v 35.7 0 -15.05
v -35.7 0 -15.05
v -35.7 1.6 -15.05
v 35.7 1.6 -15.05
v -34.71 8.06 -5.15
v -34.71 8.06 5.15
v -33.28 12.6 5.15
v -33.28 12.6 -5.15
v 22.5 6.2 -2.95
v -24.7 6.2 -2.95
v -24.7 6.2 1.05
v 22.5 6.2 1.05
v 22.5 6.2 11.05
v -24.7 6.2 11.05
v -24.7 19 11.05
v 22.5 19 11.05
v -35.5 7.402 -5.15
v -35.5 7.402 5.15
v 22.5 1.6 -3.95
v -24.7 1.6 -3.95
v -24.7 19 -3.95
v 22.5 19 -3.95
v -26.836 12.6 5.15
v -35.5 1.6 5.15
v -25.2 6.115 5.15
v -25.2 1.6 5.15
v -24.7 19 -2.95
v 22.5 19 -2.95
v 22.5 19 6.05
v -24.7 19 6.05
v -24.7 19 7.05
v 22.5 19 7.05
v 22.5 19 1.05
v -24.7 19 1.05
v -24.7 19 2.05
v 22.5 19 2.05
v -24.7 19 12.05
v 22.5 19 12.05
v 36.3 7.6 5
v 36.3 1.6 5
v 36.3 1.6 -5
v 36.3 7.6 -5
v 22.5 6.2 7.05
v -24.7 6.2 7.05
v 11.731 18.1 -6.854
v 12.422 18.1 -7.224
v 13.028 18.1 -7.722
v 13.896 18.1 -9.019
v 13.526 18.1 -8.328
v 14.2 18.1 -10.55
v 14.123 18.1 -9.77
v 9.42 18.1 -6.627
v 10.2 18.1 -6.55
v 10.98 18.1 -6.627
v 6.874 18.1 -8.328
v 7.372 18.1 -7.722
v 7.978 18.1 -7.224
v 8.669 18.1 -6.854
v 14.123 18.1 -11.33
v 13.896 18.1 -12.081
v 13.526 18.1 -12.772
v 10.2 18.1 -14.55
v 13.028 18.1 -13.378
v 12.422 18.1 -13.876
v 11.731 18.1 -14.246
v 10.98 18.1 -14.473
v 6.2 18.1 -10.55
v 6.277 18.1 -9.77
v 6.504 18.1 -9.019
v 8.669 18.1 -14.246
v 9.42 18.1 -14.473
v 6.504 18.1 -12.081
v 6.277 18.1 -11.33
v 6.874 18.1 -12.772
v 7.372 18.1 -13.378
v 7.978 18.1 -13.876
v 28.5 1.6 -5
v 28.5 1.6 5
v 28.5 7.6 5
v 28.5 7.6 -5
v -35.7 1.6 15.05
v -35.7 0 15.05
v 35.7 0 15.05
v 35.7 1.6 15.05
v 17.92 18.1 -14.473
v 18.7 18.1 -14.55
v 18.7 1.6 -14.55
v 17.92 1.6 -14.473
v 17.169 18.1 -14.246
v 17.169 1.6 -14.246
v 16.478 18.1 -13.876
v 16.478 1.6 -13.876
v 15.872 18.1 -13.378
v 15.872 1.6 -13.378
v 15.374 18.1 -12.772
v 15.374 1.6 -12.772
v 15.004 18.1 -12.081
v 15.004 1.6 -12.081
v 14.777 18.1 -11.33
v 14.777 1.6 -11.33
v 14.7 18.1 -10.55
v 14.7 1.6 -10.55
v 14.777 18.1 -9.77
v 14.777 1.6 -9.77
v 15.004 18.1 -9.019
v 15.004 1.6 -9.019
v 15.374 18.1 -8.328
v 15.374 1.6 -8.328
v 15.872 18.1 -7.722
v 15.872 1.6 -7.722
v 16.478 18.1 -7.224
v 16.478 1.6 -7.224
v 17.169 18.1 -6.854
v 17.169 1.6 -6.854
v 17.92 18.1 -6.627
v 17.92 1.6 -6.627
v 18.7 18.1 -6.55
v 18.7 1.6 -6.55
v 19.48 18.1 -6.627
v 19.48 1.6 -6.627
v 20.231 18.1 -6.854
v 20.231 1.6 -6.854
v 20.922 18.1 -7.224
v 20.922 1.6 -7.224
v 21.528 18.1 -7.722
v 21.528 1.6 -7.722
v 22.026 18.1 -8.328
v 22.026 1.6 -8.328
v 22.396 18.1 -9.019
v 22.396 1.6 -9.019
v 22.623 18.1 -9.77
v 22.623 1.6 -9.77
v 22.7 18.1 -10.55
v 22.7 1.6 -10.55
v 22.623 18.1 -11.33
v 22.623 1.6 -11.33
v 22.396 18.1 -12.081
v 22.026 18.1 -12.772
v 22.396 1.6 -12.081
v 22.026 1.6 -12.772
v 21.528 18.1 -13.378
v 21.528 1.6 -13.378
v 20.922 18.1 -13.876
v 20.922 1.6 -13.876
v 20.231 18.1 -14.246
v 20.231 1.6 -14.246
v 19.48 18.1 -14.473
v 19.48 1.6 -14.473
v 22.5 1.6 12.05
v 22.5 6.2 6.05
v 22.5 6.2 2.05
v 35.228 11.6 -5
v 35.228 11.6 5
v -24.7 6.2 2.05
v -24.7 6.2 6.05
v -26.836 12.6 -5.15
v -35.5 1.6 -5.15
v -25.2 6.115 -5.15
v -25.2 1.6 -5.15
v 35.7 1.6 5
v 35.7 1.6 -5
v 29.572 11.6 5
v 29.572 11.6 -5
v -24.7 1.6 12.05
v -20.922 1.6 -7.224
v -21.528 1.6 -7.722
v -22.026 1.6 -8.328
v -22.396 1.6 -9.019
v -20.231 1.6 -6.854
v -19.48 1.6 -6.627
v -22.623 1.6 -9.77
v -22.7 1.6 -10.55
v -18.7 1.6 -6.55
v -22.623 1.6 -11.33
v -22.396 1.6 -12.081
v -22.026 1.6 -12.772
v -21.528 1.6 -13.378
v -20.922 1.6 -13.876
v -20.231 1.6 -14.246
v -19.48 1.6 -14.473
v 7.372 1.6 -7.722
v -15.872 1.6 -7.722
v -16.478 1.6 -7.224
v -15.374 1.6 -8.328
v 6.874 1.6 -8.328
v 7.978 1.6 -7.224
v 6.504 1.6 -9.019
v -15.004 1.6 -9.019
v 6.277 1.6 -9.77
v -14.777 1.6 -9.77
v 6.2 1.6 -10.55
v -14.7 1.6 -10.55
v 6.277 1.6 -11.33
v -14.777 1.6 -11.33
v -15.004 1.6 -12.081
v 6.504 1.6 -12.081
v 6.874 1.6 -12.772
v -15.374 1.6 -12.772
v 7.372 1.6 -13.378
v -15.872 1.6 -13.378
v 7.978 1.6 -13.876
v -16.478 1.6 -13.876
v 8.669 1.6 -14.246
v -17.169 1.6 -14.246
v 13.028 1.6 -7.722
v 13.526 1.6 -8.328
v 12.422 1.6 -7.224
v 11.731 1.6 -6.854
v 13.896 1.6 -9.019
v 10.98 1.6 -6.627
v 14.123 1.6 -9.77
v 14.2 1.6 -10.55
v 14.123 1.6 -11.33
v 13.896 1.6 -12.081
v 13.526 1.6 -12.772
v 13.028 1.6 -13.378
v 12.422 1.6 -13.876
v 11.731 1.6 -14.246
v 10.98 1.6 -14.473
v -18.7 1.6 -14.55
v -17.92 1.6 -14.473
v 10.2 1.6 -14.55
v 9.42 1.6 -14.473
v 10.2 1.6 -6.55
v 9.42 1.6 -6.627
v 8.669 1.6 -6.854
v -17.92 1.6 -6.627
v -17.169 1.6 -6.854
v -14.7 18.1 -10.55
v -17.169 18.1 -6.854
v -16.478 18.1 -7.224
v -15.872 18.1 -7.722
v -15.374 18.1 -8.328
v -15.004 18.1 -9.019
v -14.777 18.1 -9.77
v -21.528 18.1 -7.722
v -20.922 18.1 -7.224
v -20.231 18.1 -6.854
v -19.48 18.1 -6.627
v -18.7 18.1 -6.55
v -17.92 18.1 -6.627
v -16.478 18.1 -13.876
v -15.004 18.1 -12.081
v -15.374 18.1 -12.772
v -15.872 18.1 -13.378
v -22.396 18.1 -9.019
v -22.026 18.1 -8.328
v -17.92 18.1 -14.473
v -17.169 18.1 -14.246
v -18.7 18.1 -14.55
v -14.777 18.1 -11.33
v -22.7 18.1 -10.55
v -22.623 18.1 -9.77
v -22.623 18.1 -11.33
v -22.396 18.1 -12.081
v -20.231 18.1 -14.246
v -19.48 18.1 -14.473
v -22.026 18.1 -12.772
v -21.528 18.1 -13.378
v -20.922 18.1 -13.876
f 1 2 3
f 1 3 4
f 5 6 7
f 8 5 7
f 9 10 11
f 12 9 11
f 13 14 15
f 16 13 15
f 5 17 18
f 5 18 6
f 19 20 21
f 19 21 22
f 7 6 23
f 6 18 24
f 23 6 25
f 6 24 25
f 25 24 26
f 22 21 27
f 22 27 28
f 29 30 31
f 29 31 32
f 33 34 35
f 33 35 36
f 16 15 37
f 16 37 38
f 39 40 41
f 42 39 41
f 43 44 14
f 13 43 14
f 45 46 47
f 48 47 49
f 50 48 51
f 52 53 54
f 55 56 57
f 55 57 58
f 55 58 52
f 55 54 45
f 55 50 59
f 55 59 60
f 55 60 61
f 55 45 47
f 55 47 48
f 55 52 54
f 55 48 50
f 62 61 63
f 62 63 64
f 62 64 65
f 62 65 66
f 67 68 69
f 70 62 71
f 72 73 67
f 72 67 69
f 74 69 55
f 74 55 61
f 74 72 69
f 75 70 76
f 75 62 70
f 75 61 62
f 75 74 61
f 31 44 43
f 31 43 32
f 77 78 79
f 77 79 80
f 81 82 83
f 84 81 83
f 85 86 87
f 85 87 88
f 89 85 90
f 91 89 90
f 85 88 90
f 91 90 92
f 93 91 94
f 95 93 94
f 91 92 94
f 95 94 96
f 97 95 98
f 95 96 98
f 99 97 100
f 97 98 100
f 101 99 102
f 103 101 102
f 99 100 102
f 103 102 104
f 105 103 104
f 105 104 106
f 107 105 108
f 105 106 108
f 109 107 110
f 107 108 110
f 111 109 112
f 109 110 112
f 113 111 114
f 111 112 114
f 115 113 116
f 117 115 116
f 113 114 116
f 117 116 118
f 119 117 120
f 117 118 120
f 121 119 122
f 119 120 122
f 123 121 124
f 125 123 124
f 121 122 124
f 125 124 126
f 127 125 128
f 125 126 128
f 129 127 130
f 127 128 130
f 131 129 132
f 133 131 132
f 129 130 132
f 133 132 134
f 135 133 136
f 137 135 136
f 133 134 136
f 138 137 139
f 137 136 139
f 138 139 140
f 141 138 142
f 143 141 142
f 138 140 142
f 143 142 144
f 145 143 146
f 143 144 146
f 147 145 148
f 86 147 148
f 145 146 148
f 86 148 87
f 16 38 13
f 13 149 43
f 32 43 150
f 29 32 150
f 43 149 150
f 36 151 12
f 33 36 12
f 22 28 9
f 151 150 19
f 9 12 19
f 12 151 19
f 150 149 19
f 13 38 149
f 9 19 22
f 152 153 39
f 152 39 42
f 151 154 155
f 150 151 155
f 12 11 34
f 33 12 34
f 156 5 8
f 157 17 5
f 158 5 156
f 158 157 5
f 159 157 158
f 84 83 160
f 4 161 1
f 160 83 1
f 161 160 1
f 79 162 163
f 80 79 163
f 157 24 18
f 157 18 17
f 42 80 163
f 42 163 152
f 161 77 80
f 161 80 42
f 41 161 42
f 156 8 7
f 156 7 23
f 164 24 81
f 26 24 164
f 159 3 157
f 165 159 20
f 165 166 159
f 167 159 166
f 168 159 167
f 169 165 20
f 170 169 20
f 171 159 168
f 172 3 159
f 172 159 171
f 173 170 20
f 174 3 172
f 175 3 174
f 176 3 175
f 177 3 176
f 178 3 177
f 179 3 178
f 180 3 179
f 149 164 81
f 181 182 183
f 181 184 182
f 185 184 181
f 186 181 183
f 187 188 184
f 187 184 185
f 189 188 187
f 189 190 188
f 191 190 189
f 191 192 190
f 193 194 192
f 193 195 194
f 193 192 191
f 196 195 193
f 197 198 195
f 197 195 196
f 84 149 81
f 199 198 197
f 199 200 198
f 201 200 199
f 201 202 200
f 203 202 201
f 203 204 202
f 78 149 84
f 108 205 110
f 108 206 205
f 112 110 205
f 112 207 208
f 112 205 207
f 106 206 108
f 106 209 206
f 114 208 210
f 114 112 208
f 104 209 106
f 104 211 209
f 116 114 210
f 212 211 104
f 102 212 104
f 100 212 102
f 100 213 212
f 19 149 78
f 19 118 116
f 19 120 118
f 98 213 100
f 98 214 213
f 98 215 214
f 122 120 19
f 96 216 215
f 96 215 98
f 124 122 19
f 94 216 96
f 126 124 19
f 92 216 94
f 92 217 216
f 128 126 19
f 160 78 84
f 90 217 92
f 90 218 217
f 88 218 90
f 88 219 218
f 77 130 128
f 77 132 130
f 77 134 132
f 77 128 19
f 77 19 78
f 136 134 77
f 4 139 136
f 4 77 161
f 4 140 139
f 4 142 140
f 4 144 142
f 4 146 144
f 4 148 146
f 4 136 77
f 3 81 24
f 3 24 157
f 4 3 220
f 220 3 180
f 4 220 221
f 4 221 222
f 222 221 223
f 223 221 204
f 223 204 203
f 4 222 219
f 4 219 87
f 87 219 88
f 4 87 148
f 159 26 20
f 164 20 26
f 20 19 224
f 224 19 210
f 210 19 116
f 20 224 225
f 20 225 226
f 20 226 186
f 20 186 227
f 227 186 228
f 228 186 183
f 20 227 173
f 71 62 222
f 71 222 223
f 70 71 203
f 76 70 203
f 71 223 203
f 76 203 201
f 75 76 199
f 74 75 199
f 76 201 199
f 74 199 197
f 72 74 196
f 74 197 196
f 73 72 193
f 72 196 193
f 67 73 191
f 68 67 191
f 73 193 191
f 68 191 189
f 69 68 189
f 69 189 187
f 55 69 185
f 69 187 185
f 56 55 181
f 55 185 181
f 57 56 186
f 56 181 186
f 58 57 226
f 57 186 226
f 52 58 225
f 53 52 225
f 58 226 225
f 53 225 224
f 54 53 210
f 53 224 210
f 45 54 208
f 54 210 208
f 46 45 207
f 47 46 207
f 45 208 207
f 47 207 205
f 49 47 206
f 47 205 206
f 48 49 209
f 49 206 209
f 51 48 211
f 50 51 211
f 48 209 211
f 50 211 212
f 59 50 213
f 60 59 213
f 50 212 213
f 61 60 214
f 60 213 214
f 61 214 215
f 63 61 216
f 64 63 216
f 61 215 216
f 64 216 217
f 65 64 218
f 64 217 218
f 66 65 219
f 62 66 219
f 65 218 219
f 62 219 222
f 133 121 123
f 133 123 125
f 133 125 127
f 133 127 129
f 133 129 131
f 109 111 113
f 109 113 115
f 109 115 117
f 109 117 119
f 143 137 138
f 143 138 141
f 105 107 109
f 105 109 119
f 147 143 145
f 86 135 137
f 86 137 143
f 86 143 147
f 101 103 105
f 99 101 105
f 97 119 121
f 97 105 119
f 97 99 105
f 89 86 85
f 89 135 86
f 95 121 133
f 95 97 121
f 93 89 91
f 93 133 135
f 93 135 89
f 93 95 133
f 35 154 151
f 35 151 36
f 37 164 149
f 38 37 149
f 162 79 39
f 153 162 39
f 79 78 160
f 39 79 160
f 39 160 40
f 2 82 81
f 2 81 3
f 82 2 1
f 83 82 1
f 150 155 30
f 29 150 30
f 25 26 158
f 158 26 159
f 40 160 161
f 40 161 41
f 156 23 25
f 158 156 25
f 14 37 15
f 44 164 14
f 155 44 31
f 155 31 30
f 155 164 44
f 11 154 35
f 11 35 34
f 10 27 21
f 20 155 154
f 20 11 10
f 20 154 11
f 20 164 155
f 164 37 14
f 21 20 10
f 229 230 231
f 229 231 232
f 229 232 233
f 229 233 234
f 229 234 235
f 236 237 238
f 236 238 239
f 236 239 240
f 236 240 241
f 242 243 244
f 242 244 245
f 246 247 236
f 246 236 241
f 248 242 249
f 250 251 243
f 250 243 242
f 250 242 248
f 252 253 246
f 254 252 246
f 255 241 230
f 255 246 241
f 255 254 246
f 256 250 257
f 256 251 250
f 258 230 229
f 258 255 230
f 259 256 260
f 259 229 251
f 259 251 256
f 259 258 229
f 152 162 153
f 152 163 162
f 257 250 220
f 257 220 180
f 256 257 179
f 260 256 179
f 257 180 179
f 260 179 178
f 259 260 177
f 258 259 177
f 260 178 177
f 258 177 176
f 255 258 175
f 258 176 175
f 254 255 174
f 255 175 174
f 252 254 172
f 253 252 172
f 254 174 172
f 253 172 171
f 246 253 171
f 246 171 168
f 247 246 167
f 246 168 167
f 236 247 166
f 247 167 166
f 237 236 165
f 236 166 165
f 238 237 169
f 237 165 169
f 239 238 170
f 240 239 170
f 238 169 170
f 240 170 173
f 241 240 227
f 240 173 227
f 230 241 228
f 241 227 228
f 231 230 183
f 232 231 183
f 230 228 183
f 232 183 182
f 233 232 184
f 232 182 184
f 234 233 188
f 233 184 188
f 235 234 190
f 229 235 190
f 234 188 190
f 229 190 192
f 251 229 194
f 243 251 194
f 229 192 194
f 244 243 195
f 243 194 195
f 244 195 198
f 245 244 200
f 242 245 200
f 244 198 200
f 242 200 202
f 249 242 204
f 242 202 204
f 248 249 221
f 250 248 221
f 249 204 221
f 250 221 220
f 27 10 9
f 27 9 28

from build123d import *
from OCP.BRepFilletAPI import BRepFilletAPI_MakeChamfer

# Parameters (mm, degrees)
SKETCH1_W           = 71.4
SKETCH1_H           = 30.1
BOSS_EXTRUDE1_DEPTH = 1.6
SKETCH4_W           = 47.2
SKETCH4_H           = 16
BOSS_EXTRUDE2_DEPTH = 17.4
SKETCH5_W           = 10.3
SKETCH5_H           = 10.3
BOSS_EXTRUDE3_DEPTH = 11
SKETCH6_W           = 7.8
SKETCH6_H           = 10
BOSS_EXTRUDE4_DEPTH = 10
SKETCH7_R           = 4
BOSS_EXTRUDE5_DEPTH = 16.5
SKETCH8_W           = 4
SKETCH8_H           = 12.8
CUT_EXTRUDE1_DEPTH  = 47.2
CUT_EXTRUDE2_DEPTH  = 10.3
CHAMFER1_SIZE       = 4
CHAMFER1_SIZE2      = 1.07179677


with BuildPart() as part:
    # Sketch1 → Boss-Extrude1 (new body)
    with BuildSketch(Plane(origin=(0, 0, 0), x_dir=(1, 0, 0), z_dir=(0, 1, 0))):
        Rectangle(SKETCH1_W, SKETCH1_H)
    extrude(amount=BOSS_EXTRUDE1_DEPTH)

    # Sketch4 → Boss-Extrude2 (add)
    with BuildSketch(Plane(origin=(0, 1.6, 0), x_dir=(1, 0, 0), z_dir=(0, 1, 0))):
        with Locations((-1.1, -4.05)):
            Rectangle(SKETCH4_W, SKETCH4_H)
    extrude(amount=BOSS_EXTRUDE2_DEPTH)

    # Sketch5 → Boss-Extrude3 (add)
    with BuildSketch(Plane(origin=(0, 1.6, 0), x_dir=(1, 0, 0), z_dir=(0, 1, 0))):
        with Locations((-30.35, 0)):
            Rectangle(SKETCH5_W, SKETCH5_H)
    extrude(amount=BOSS_EXTRUDE3_DEPTH)

    # Sketch6 → Boss-Extrude4 (add)
    with BuildSketch(Plane(origin=(0, 1.6, 0), x_dir=(1, 0, 0), z_dir=(0, 1, 0))):
        with Locations((32.4, 0)):
            Rectangle(SKETCH6_W, SKETCH6_H)
    extrude(amount=BOSS_EXTRUDE4_DEPTH)

    # Sketch7 → Boss-Extrude5 (add)
    with BuildSketch(Plane(origin=(0, 1.6, 0), x_dir=(1, 0, 0), z_dir=(0, 1, 0))):
        with Locations(Location((18.7, 10.55, 0), (0, 0, 90))):
            Circle(SKETCH7_R)
        with Locations(Location((10.2, 10.55, 0), (0, 0, 90))):
            Circle(SKETCH7_R)
        with Locations(Location((-18.7, 10.55, 0), (0, 0, 90))):
            Circle(SKETCH7_R)
    extrude(amount=BOSS_EXTRUDE5_DEPTH)

    # Sketch8 → Cut-Extrude1 (cut)
    with BuildSketch(Plane.ZY.offset(24.7)):
        with Locations((-0.95, 12.6)):
            Rectangle(SKETCH8_W, SKETCH8_H)
        with Locations((4.05, 12.6)):
            Rectangle(SKETCH8_W, SKETCH8_H)
        with Locations((9.05, 12.6)):
            Rectangle(SKETCH8_W, SKETCH8_H)
    extrude(amount=-CUT_EXTRUDE1_DEPTH, mode=Mode.SUBTRACT)

    # Sketch9 → Cut-Extrude2 (cut)
    with BuildSketch(Plane.XY.offset(5.15)):
        Polygon((-35.5, 12.6), (-35.5, 7.401794315), (-34.710010842, 8.059862443), (-33.280204433, 12.6), align=None)
        Polygon((-25.2, 12.6), (-26.836436424, 12.6), (-25.2, 6.114977788), align=None)
    extrude(amount=-CUT_EXTRUDE2_DEPTH, mode=Mode.SUBTRACT)

    # Chamfer1: one chamfer whose edges measure the first distance from different faces: ONE call of the kernel's chamfer builder (chamfer() names one face for all edges)
    chamfer1_edges_1 = [part.edges().sort_by_distance(p)[0] for p in [
        (36.3, 11.6, 0),
    ]]
    chamfer1_side_1 = [part.faces().sort_by_distance(p)[0] for p in [
        (36.3, 6.6, 0),
    ]]
    chamfer1_edges_2 = [part.edges().sort_by_distance(p)[0] for p in [
        (28.5, 11.6, 0),
    ]]
    chamfer1_side_2 = [part.faces().sort_by_distance(p)[0] for p in [
        (28.5, 6.6, 0),
    ]]
    chamfer1 = BRepFilletAPI_MakeChamfer(part.part.solid().wrapped)
    for e in chamfer1_edges_1:
        chamfer1.Add(CHAMFER1_SIZE, CHAMFER1_SIZE2, e.wrapped, chamfer1_side_1[0].wrapped)  # the first distance lies on this face
    for e in chamfer1_edges_2:
        chamfer1.Add(CHAMFER1_SIZE, CHAMFER1_SIZE2, e.wrapped, chamfer1_side_2[0].wrapped)  # the first distance lies on this face
    add(Compound.cast(chamfer1.Shape()), mode=Mode.REPLACE)


solid = part.part
